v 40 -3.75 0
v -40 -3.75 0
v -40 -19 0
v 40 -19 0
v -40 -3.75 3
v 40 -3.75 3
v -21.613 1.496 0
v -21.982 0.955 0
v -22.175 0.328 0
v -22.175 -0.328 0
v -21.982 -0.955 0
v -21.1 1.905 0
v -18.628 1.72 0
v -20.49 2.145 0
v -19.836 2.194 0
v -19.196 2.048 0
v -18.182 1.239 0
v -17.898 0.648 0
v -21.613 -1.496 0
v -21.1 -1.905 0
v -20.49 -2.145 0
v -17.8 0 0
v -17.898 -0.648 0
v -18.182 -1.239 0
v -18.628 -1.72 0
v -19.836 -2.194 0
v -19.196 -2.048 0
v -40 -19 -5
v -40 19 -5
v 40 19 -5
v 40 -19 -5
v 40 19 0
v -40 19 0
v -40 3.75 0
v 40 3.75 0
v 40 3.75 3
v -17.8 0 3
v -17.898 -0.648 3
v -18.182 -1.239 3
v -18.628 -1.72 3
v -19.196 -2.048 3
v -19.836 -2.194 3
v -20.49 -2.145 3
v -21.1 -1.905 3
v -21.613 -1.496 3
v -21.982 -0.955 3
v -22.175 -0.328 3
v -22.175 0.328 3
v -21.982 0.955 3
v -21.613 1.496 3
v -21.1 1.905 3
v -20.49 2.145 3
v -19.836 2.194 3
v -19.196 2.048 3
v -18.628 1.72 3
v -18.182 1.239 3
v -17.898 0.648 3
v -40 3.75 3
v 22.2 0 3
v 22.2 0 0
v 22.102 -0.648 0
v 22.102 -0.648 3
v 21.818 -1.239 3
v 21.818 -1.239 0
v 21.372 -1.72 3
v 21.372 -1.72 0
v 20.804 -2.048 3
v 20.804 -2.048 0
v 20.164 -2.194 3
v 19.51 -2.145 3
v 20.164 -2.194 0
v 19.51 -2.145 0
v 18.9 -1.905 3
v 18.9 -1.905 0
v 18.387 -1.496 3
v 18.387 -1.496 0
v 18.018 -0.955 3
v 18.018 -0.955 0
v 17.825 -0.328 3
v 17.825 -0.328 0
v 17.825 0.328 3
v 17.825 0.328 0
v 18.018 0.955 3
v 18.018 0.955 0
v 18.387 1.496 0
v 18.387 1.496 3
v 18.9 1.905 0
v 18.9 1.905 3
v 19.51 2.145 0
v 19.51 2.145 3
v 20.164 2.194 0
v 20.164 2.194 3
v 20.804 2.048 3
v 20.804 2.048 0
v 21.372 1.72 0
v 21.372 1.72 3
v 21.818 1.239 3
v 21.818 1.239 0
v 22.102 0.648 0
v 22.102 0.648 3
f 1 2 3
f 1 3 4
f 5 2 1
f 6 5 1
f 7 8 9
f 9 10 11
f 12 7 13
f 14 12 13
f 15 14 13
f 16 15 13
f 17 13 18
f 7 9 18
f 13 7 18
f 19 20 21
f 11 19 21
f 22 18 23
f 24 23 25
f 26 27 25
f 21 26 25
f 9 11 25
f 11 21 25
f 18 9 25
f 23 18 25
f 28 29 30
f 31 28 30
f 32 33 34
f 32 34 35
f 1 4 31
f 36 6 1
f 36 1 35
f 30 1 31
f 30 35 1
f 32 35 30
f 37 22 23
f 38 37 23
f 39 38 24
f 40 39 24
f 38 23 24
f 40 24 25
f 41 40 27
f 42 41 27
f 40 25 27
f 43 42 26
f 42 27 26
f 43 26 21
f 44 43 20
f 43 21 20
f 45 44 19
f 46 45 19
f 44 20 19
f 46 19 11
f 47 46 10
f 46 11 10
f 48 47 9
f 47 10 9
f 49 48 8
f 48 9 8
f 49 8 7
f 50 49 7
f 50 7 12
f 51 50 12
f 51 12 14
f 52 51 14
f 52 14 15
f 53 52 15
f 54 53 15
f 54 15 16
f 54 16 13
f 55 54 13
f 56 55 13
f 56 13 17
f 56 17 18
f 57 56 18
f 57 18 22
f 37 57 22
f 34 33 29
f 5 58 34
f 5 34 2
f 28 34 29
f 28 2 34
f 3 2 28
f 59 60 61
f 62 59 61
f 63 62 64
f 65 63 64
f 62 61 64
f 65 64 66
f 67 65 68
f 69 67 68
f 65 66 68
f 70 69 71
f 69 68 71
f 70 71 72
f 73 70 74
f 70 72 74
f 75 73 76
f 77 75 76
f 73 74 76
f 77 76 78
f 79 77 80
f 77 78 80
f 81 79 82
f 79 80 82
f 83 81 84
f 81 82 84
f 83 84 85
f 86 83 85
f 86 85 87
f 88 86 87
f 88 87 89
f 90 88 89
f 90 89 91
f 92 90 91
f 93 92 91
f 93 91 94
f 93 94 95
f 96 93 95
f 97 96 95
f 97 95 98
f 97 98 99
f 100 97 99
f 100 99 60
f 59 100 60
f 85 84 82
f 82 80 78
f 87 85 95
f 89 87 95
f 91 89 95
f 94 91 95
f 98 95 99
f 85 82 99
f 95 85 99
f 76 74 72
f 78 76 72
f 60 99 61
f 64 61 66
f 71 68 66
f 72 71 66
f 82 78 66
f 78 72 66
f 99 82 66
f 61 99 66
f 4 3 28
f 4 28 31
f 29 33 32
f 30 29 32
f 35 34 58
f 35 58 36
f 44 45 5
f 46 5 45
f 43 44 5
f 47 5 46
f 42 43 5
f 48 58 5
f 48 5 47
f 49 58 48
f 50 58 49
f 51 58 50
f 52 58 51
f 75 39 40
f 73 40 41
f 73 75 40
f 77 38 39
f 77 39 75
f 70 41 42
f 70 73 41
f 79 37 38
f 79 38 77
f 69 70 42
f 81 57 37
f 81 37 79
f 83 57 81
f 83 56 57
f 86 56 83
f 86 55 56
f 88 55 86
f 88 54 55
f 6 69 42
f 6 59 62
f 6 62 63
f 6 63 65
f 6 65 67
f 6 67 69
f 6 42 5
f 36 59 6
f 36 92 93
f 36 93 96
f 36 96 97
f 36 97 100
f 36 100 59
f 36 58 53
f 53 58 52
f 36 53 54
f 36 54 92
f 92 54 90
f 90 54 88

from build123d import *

# Parameters (mm, degrees)
F0_W     = 80
F0_H     = 15.25
F0_H_2   = 7.5
F1_DEPTH = 5
F2_DEPTH = 3
F4_D     = 4.4
F4_DEPTH = 3.001


with BuildPart() as f1:
    # F0 (on Top) → F1 (new body)
    with BuildSketch(Plane.XY):
        with Locations((0, 11.375)):
            Rectangle(F0_W, F0_H)
        with Locations((0, -11.375)):
            Rectangle(F0_W, F0_H)
        Rectangle(F0_W, F0_H_2)
    extrude(amount=-F1_DEPTH)

    # F0 (on Top) → F2 (join)
    with BuildSketch(Plane.XY):
        Rectangle(F0_W, F0_H_2)
    extrude(amount=F2_DEPTH)

    # F4 (through all, one way)
    with BuildSketch(Plane(origin=(0, 0, 0), x_dir=(1, 0, 0), z_dir=(0, 0, -1))):
        with Locations((-20, 0), (20, 0)):
            Circle(F4_D / 2)
    extrude(amount=-F4_DEPTH, mode=Mode.SUBTRACT)


solid = f1.part
